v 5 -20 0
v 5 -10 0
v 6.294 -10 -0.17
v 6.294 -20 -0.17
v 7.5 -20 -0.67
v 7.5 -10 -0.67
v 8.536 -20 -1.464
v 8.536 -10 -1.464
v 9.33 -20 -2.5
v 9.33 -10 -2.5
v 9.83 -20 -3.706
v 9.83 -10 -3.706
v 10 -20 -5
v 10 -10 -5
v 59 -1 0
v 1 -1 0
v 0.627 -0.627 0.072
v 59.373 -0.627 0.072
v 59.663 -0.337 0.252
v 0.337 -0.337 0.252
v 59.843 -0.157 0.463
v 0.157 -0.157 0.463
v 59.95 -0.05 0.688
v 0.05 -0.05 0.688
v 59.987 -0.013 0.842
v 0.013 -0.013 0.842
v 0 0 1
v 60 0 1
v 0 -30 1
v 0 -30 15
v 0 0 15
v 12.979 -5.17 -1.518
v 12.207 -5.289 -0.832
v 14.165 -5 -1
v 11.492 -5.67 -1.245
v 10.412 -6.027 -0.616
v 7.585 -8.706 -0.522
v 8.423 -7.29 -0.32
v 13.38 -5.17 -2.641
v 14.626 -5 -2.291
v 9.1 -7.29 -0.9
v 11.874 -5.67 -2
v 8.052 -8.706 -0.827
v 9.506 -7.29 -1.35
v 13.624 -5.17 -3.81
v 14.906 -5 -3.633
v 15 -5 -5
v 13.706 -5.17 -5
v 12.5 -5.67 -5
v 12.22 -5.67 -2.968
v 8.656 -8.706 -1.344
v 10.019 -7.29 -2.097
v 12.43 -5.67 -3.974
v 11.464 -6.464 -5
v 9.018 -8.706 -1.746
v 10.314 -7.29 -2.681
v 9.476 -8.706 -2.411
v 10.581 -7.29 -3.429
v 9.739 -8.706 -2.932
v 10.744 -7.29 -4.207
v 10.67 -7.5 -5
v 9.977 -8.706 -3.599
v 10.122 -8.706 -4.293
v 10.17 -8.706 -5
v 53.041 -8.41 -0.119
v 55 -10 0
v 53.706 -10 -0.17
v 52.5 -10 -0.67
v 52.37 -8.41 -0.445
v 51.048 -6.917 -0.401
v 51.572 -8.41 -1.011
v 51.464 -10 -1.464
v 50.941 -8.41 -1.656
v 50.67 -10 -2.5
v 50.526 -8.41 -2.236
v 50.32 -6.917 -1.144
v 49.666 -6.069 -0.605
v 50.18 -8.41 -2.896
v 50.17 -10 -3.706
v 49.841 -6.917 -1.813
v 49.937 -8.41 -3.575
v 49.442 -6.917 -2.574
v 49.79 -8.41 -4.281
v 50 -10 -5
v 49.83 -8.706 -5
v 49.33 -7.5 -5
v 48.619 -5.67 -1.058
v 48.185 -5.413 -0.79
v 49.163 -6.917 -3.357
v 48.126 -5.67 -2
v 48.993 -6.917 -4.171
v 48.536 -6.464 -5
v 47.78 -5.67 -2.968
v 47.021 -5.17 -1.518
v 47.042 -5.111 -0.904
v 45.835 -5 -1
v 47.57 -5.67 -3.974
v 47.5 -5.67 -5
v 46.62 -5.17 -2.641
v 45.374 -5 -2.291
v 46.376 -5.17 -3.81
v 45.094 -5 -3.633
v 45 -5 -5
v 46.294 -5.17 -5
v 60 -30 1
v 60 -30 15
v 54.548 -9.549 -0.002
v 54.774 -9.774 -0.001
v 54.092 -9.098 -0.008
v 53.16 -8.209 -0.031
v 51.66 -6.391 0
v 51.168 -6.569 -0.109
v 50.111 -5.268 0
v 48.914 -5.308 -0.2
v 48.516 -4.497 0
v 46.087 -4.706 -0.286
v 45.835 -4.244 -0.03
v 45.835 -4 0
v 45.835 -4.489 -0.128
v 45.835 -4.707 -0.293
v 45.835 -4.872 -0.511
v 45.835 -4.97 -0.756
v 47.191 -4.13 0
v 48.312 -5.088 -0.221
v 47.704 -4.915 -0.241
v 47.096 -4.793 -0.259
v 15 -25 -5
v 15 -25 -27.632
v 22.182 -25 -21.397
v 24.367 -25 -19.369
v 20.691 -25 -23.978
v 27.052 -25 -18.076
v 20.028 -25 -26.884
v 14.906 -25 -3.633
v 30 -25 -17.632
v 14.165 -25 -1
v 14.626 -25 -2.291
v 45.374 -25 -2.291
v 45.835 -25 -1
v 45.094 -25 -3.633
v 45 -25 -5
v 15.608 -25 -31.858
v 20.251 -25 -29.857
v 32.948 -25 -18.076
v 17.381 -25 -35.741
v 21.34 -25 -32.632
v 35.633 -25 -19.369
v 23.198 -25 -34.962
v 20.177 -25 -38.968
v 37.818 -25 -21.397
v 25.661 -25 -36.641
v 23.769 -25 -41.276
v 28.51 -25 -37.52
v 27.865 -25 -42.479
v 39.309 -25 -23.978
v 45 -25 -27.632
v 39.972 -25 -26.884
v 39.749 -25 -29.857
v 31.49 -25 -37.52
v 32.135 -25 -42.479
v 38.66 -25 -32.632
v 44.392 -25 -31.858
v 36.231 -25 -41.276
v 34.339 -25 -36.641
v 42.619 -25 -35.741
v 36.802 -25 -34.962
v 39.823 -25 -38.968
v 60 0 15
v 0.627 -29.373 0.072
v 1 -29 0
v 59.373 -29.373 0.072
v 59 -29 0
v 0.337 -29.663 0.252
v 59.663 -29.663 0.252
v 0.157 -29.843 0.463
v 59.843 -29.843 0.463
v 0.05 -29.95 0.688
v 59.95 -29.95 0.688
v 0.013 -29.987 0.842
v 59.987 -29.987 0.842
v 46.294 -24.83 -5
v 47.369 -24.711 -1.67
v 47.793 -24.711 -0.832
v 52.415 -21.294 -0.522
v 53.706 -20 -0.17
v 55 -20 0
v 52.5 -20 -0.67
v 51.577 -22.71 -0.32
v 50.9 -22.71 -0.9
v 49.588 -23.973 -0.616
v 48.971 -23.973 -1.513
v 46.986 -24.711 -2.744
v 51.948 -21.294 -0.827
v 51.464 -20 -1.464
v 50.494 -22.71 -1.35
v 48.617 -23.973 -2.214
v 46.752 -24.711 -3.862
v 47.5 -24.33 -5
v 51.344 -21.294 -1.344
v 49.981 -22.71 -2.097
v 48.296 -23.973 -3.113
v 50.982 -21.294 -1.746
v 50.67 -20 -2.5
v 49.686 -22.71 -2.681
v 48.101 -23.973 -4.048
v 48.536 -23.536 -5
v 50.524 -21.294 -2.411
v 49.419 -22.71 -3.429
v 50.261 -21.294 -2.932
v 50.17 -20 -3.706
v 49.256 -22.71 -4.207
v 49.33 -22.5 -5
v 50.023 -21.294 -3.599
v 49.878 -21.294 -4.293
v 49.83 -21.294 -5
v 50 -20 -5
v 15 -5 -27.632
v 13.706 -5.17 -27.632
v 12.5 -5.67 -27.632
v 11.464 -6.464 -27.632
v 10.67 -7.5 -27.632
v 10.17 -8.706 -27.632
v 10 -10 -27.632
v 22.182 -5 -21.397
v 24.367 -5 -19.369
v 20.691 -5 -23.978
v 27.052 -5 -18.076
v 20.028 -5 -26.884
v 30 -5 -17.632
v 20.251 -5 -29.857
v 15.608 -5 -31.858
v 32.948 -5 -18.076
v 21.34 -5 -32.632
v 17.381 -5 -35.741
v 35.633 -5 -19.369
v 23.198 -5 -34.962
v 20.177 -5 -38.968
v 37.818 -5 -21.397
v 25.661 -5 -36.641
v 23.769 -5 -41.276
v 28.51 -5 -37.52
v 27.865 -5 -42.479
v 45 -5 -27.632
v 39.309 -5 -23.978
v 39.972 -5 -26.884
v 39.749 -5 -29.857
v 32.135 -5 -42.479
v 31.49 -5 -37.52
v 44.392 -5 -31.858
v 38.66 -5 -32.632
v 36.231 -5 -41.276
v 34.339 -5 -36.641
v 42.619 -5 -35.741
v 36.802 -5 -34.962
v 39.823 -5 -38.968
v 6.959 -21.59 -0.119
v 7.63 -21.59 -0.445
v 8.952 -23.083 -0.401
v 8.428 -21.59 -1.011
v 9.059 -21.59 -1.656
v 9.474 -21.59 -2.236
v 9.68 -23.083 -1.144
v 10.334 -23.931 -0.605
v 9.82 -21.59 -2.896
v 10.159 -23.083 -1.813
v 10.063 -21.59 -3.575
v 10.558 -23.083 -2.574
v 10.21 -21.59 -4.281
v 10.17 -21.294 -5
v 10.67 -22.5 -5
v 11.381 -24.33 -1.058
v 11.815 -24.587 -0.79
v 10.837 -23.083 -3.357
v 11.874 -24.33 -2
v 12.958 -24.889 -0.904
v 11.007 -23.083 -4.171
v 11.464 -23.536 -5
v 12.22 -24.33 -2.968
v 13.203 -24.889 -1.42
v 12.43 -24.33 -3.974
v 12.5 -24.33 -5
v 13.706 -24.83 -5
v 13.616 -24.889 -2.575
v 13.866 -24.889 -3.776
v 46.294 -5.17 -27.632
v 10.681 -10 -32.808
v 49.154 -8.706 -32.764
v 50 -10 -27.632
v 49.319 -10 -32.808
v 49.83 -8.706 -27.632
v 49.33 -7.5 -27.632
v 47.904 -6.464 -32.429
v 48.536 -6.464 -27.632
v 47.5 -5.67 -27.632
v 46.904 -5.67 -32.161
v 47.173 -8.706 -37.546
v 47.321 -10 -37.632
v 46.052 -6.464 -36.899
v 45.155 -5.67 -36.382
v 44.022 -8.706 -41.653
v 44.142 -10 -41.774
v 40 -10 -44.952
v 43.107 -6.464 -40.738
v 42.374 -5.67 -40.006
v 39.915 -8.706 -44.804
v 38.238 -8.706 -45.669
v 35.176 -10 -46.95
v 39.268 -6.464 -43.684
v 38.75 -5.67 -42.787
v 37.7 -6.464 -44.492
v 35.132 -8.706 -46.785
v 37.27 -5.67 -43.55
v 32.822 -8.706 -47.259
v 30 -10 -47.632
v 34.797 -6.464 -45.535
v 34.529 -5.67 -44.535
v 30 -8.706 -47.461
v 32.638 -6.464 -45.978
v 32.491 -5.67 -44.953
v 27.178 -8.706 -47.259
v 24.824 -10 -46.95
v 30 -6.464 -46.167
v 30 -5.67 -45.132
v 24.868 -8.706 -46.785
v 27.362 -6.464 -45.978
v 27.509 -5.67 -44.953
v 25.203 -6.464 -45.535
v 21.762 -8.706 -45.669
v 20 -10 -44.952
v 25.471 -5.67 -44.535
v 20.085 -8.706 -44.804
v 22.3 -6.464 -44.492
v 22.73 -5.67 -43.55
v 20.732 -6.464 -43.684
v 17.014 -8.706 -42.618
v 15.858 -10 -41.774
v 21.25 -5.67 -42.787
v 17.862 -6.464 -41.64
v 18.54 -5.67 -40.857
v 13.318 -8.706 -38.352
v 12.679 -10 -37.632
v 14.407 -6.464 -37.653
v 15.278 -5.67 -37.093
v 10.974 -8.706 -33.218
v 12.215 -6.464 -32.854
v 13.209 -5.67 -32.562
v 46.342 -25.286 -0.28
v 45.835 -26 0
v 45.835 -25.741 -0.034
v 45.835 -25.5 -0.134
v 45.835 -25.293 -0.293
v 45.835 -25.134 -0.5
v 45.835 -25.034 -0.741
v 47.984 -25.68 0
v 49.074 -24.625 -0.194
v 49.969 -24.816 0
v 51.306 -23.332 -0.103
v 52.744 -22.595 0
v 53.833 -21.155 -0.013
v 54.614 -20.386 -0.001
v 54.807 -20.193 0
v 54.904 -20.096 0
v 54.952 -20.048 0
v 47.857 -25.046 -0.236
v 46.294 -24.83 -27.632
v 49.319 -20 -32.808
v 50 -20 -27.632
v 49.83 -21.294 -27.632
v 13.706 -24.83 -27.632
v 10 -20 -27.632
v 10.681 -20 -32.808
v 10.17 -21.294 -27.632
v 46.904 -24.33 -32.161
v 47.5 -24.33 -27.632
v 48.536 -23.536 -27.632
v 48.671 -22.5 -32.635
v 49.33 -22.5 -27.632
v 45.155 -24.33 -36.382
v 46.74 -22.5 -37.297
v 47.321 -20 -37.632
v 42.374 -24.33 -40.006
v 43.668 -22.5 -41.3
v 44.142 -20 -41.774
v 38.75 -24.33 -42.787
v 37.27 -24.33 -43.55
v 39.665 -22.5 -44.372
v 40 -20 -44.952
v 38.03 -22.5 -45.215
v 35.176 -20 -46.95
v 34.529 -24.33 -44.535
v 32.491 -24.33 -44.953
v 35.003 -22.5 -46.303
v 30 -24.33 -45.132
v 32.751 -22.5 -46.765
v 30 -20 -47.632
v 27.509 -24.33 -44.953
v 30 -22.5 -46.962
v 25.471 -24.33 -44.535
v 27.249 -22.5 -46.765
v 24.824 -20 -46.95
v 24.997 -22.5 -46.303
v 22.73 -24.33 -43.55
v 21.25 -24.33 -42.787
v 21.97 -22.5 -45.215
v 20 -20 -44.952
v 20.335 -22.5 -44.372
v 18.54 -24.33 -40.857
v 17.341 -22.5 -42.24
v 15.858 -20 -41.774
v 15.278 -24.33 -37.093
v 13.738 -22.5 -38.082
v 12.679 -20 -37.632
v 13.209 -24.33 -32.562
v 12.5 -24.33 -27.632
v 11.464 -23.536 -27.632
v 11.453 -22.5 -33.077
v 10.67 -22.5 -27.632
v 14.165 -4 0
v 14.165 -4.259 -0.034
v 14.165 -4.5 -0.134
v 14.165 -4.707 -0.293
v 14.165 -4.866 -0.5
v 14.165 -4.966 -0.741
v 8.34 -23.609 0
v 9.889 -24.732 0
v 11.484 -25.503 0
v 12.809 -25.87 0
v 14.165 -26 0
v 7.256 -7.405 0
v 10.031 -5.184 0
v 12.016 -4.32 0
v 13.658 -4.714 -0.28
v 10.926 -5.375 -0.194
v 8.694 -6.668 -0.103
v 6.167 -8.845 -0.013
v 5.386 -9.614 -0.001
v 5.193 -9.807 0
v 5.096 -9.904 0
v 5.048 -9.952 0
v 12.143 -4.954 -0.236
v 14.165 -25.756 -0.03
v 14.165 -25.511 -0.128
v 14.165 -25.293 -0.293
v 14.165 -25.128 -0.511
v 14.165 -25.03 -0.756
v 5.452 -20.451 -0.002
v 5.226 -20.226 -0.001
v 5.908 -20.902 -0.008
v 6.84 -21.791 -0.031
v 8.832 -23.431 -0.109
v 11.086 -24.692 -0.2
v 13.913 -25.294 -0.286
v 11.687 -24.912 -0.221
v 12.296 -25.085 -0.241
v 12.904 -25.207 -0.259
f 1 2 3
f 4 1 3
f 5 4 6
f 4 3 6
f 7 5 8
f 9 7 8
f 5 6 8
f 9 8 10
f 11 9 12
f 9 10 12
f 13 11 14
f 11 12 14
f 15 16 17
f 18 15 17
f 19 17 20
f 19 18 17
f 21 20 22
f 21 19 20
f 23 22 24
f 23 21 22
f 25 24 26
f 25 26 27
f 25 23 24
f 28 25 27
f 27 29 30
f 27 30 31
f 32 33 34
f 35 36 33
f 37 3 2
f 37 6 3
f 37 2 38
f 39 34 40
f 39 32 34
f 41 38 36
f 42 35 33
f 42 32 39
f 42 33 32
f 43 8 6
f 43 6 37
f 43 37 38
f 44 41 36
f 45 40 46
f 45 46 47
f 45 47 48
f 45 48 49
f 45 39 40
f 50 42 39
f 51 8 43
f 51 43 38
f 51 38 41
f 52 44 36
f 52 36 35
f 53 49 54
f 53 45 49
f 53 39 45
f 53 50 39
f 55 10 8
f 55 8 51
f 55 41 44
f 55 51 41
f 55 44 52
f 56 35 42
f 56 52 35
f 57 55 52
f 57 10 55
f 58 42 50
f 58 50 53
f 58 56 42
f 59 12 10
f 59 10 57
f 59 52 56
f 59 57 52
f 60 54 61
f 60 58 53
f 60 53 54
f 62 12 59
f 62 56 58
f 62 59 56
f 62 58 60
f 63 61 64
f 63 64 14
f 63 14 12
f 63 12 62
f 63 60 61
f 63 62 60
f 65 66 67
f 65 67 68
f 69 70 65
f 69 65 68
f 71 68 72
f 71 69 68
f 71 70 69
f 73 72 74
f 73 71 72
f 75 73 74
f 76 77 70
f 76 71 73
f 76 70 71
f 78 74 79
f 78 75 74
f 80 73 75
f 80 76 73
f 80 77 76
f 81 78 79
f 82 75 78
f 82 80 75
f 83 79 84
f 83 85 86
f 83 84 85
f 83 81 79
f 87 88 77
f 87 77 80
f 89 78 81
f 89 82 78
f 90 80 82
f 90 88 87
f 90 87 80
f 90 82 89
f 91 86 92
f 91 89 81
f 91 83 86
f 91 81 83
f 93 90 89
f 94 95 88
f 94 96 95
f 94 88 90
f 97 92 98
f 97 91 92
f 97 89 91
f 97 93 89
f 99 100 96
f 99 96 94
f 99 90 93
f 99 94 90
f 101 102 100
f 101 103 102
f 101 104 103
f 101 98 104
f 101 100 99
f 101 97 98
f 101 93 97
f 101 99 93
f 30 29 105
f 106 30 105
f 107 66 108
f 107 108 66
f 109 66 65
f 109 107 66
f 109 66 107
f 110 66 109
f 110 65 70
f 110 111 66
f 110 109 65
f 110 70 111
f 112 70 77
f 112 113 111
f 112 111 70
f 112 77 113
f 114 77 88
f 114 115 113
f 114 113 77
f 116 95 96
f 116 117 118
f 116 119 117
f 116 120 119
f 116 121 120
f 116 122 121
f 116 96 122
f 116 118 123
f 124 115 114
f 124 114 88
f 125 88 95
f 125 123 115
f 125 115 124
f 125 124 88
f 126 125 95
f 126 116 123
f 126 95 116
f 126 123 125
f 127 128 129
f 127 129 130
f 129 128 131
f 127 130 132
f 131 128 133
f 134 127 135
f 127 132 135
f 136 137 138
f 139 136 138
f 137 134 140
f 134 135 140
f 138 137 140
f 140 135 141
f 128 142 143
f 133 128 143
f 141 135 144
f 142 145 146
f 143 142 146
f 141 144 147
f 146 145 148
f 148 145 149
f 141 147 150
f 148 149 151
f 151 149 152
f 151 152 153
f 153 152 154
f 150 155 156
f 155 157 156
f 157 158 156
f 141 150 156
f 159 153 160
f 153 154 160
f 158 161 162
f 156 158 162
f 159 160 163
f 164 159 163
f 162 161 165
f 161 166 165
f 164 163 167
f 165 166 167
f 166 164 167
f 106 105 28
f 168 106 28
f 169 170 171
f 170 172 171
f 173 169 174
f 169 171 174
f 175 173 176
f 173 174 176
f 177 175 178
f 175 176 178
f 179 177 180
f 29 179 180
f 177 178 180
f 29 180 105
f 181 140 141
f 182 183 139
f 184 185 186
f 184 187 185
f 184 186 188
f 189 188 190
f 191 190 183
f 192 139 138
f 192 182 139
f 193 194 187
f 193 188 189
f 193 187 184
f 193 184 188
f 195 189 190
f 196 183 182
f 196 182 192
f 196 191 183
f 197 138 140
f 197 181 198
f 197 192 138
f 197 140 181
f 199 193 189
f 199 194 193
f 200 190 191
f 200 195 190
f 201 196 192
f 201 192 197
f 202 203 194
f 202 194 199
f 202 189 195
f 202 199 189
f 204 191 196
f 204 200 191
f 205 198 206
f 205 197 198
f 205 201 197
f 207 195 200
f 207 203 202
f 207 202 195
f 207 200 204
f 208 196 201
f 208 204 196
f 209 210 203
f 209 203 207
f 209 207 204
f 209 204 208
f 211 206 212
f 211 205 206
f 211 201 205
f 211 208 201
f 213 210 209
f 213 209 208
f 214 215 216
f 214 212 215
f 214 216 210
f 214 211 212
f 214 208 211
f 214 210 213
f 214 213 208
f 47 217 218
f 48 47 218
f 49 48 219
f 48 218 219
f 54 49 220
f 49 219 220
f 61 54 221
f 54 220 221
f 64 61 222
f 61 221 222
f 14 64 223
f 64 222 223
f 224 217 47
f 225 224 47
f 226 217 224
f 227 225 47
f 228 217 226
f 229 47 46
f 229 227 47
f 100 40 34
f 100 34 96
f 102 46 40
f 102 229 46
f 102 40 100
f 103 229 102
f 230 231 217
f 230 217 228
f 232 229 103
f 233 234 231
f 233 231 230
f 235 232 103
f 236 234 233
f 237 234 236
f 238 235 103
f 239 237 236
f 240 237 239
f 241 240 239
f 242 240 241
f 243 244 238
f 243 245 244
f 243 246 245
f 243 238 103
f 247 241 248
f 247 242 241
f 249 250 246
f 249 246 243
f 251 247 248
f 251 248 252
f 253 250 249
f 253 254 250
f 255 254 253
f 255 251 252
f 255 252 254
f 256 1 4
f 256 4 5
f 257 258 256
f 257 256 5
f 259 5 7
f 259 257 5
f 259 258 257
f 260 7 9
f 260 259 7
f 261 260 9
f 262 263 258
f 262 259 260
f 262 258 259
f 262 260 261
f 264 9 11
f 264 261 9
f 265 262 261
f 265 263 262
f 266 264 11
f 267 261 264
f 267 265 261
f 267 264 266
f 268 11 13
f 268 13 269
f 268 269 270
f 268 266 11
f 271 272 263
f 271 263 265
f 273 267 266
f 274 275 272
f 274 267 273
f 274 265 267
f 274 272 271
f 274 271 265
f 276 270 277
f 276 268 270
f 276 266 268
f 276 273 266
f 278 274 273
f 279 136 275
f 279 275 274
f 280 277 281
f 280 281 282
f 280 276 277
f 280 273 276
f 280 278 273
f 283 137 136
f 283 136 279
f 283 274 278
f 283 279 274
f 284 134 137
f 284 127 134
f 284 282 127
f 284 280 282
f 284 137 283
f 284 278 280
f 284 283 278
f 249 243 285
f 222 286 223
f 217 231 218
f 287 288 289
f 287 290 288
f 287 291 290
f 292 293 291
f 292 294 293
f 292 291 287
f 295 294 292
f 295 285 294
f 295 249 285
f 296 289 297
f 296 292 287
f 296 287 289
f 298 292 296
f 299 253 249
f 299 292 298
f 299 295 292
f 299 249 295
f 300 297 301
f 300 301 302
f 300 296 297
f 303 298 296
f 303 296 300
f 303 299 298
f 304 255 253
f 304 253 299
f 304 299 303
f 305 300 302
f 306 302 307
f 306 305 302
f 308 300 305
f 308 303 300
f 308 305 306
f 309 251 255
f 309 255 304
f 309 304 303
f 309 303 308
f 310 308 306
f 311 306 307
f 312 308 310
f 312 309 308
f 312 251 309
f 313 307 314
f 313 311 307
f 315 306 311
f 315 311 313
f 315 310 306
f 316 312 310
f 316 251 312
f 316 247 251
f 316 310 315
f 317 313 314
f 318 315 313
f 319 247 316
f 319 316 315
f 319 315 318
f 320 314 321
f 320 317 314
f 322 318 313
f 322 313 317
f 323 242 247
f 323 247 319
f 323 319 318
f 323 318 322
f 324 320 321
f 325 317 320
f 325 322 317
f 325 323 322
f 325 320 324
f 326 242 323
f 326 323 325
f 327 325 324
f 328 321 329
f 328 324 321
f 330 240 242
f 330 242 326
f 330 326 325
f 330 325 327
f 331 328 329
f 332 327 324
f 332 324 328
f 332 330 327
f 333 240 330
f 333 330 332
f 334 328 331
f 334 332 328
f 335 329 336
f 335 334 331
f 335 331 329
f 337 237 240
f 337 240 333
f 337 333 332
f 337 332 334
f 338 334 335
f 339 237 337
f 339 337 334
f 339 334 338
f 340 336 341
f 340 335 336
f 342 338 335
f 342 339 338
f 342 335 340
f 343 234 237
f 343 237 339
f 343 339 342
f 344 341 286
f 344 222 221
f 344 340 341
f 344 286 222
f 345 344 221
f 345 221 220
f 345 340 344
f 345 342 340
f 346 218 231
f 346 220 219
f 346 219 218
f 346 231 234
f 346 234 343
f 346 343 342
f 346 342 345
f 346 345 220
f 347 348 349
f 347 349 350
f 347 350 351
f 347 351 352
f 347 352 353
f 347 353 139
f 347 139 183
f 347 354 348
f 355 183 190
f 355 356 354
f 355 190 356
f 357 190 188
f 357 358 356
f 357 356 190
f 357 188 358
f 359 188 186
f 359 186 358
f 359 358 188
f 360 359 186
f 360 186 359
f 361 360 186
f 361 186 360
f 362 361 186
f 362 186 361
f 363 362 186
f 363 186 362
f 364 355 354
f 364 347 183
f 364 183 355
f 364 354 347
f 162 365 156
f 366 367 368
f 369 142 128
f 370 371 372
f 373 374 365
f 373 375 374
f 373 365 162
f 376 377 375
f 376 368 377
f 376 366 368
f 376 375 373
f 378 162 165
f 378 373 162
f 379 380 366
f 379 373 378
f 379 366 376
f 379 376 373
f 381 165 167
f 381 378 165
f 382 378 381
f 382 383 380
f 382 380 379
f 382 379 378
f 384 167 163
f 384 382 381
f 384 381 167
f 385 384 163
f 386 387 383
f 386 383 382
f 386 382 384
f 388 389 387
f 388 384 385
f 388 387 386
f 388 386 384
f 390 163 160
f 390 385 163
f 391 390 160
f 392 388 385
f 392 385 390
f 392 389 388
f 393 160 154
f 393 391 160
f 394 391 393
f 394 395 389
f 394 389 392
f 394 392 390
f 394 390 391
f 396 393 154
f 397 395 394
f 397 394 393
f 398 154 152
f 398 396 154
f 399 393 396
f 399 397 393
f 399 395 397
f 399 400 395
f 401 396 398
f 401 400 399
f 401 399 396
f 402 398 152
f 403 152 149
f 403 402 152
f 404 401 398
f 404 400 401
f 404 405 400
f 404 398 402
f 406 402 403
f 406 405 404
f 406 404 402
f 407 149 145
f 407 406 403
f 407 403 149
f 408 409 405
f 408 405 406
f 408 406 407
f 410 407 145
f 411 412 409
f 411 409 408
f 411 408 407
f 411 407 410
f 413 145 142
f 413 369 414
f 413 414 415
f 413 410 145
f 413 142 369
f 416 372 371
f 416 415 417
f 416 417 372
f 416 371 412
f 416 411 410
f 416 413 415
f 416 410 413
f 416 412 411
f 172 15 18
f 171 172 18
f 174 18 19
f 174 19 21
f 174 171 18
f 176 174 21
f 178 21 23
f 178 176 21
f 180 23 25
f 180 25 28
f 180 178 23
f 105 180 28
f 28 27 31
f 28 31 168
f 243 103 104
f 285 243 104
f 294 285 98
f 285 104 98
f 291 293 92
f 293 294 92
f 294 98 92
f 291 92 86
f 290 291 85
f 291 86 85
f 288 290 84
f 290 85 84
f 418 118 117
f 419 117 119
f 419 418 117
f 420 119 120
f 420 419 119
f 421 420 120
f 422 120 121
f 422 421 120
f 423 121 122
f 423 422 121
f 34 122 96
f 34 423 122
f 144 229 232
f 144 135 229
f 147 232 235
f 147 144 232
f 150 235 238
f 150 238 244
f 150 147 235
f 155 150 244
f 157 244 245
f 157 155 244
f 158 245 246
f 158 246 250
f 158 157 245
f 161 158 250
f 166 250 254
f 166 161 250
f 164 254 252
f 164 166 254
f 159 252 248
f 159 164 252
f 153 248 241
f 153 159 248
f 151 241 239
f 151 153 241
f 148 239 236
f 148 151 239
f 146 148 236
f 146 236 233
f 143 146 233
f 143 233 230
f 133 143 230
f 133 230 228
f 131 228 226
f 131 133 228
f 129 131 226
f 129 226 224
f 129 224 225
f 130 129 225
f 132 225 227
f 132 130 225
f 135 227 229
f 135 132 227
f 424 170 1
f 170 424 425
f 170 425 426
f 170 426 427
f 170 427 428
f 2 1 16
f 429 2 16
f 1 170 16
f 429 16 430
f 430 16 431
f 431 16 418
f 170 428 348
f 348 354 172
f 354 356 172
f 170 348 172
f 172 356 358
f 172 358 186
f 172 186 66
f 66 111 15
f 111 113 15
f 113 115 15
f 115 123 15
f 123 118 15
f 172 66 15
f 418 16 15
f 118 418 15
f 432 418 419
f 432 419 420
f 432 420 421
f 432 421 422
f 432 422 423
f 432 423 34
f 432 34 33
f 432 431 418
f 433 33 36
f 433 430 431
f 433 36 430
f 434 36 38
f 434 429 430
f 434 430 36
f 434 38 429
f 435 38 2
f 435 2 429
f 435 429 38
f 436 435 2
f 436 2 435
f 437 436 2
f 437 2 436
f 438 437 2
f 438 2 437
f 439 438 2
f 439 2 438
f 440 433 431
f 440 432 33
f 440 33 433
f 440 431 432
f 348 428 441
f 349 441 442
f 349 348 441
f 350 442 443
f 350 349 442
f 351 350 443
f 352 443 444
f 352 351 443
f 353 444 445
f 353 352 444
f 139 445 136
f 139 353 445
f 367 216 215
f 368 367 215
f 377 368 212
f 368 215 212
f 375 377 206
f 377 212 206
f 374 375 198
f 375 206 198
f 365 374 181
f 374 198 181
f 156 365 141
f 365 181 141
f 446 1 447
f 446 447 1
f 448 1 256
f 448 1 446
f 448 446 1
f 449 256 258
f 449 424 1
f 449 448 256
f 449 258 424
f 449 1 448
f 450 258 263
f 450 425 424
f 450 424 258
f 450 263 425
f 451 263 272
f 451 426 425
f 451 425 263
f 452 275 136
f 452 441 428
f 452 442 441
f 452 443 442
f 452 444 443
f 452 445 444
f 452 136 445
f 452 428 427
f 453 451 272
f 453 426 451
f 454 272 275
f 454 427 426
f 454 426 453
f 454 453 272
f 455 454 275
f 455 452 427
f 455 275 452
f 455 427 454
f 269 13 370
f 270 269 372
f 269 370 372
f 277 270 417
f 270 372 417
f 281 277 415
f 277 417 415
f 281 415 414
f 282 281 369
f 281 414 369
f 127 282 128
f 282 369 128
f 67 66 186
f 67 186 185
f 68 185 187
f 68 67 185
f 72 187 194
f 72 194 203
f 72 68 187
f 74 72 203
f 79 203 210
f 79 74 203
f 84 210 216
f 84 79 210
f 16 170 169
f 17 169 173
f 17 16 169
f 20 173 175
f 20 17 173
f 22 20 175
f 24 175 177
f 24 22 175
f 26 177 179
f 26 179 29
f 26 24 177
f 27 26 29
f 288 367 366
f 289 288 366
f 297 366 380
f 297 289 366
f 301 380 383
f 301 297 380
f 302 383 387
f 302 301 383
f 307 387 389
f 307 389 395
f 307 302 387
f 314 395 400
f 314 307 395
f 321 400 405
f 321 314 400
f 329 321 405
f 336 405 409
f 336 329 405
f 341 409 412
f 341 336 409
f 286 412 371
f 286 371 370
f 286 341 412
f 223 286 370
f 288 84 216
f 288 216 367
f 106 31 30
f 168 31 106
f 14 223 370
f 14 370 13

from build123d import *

# Parameters (mm, degrees)
SKETCH3_W           = 60
SKETCH3_H           = 30
BOSS_EXTRUDE1_DEPTH = 15
SKETCH4_R           = 10
BOSS_EXTRUDE2_DEPTH = 10
FILLET1_R           = 5
FILLET2_R           = 5
FILLET3_R           = 1


with BuildPart() as part:
    # Sketch3 → Boss-Extrude1 (new body)
    with BuildSketch(Plane.XY):
        with Locations((30, -15)):
            Rectangle(SKETCH3_W, SKETCH3_H)
    extrude(amount=BOSS_EXTRUDE1_DEPTH)

    # Sketch4 → Boss-Extrude2 (add, symmetric)
    with BuildSketch(Plane(origin=(0, -15, 0), x_dir=(1, 0, 0), z_dir=(0, 1, 0))):
        with BuildLine():
            Line((10, 27.631533215), (10, 0))
            Line((10, 0), (50, 0))
            Line((50, 0), (50, 27.631533215))
            ThreePointArc((50, 27.631533215), (30, 47.631533215), (10, 27.631533215))
        make_face()
        with Locations(Location((30, 27.631533215, 0), (0, 0, 270))):
            Circle(SKETCH4_R, mode=Mode.SUBTRACT)
    extrude(amount=BOSS_EXTRUDE2_DEPTH, both=True)

    # Fillet1
    fillet1_edges = [part.edges().sort_by_distance(p)[0] for p in [
        (10, -15, 0),
        (50, -15, 0),
    ]]
    fillet(fillet1_edges, radius=FILLET1_R)

    # Fillet2
    # the kernel refuses this fillet: 5 mm, written as the material it takes off along each edge
    with BuildSketch(Plane(origin=(30, -5, -27.631533215), x_dir=(1, 0, 0), z_dir=(0, 0, 1))) as fillet2_piece_1:
        with BuildLine():
            CenterArc((20 - FILLET2_R, -FILLET2_R), FILLET2_R, 0, 90)
            Line((20 - FILLET2_R, 0), (20, 0))
            Line((20, 0), (20, -FILLET2_R))
        make_face()
    revolve(axis=Axis((30, -5, -27.631533215), (0, 1, 0)), revolution_arc=180, mode=Mode.SUBTRACT)
    with BuildSketch(Plane(origin=(10, -5, -27.631533215), x_dir=(0, -1, 0), z_dir=(0, 0, 1)), Plane(origin=(50, -5, -5), x_dir=(0, -1, 0), z_dir=(0, 0, -1))) as fillet2_piece_2:
        with BuildLine():
            CenterArc((FILLET2_R, FILLET2_R), FILLET2_R, 180, 90)
            Line((0, FILLET2_R), (0, 0))
            Line((0, 0), (FILLET2_R, 0))
        make_face()
    extrude(amount=22.631533215, mode=Mode.SUBTRACT)
    with BuildSketch(Plane(origin=(30, -25, -27.631533215), x_dir=(1, 0, 0), z_dir=(0, 0, 1))) as fillet2_piece_3:
        with BuildLine():
            CenterArc((20 - FILLET2_R, FILLET2_R), FILLET2_R, 270, 90)
            Line((20 - FILLET2_R, 0), (20, 0))
            Line((20, 0), (20, FILLET2_R))
        make_face()
    revolve(axis=Axis((30, -25, -27.631533215), (0, 1, 0)), revolution_arc=180, mode=Mode.SUBTRACT)
    with BuildSketch(Plane(origin=(10, -25, -27.631533215), x_dir=(0, 1, 0), z_dir=(0, 0, 1)), Plane(origin=(50, -25, -5), x_dir=(0, 1, 0), z_dir=(0, 0, -1))) as fillet2_piece_4:
        with BuildLine():
            CenterArc((FILLET2_R, -FILLET2_R), FILLET2_R, 90, 90)
            Line((0, -FILLET2_R), (0, 0))
            Line((0, 0), (FILLET2_R, 0))
        make_face()
    extrude(amount=22.631533215, mode=Mode.SUBTRACT)
    with BuildSketch(Plane(origin=(55, -25, -5), x_dir=(0.5976672776328272, 0, -0.8017442392976484), z_dir=(-0.8017442392976484, 0, -0.5976672776328272))) as fillet2_piece_5_section:
        with BuildLine():
            CenterArc((5 + FILLET2_R, -FILLET2_R), FILLET2_R, 90, 90)
            Line((5 + FILLET2_R, 0), (5, 0))
            Line((5, 0), (5, -FILLET2_R))
        make_face()
    fillet2_piece_5 = revolve(axis=Axis((55, -25, -5), (0, -1, 0)), revolution_arc=233.296989237, mode=Mode.PRIVATE)
    fillet2_piece_5 = split(fillet2_piece_5, bisect_by=Plane(origin=(51.250305352, -23.441858441, 0), z_dir=(0, 0, -1)), keep=Keep.TOP, mode=Mode.PRIVATE)
    add(fillet2_piece_5, mode=Mode.SUBTRACT)
    with BuildSketch(Plane(origin=(55, -5, -5), x_dir=(0.5976672776328272, 0, -0.8017442392976484), z_dir=(-0.8017442392976484, 0, -0.5976672776328272))) as fillet2_piece_6_section:
        with BuildLine():
            CenterArc((5 + FILLET2_R, FILLET2_R), FILLET2_R, 180, 90)
            Line((5, FILLET2_R), (5, 0))
            Line((5, 0), (5 + FILLET2_R, 0))
        make_face()
    fillet2_piece_6 = revolve(axis=Axis((55, -5, -5), (0, -1, 0)), revolution_arc=233.296989237, mode=Mode.PRIVATE)
    fillet2_piece_6 = split(fillet2_piece_6, bisect_by=Plane(origin=(51.250305352, -6.558141559, 0), z_dir=(0, 0, -1)), keep=Keep.TOP, mode=Mode.PRIVATE)
    add(fillet2_piece_6, mode=Mode.SUBTRACT)
    with BuildSketch(Plane(origin=(5, -25, -5), x_dir=(-0.5976672776328278, 0, -0.801744239297648), z_dir=(0.801744239297648, 0, -0.5976672776328278))) as fillet2_piece_7_section:
        with BuildLine():
            CenterArc((5 + FILLET2_R, FILLET2_R), FILLET2_R, 180, 90)
            Line((5 + FILLET2_R, 0), (5, 0))
            Line((5, 0), (5, FILLET2_R))
        make_face()
    fillet2_piece_7 = revolve(axis=Axis((5, -25, -5), (0, 1, 0)), revolution_arc=233.296989237, mode=Mode.PRIVATE)
    fillet2_piece_7 = split(fillet2_piece_7, bisect_by=Plane(origin=(8.749694574, -23.441858005, 0), z_dir=(0, 0, -1)), keep=Keep.TOP, mode=Mode.PRIVATE)
    add(fillet2_piece_7, mode=Mode.SUBTRACT)
    with BuildSketch(Plane(origin=(5, -5, -5), x_dir=(-0.5976672776328278, 0, -0.801744239297648), z_dir=(0.801744239297648, 0, -0.5976672776328278))) as fillet2_piece_8_section:
        with BuildLine():
            CenterArc((5 + FILLET2_R, -FILLET2_R), FILLET2_R, 90, 90)
            Line((5 + FILLET2_R, 0), (5, 0))
            Line((5, 0), (5, -FILLET2_R))
        make_face()
    fillet2_piece_8 = revolve(axis=Axis((5, -5, -5), (0, 1, 0)), revolution_arc=233.296989237, mode=Mode.PRIVATE)
    fillet2_piece_8 = split(fillet2_piece_8, bisect_by=Plane(origin=(8.749694574, -6.558141995, 0), z_dir=(0, 0, -1)), keep=Keep.TOP, mode=Mode.PRIVATE)
    add(fillet2_piece_8, mode=Mode.SUBTRACT)

    # Fillet3
    fillet3_edges = [part.edges().sort_by_distance(p)[0] for p in [
        (30, 0, 0),
        (60, -15, 0),
        (30, -30, 0),
        (30, -25, 0),
        (0, -15, 0),
        (30, -5, 0),
        (51.140144071, -23.381125805, 0),
        (8.859855929, -23.381125805, 0),
        (51.140144071, -6.618874195, 0),
        (8.859855929, -6.618874195, 0),
    ]]
    fillet(fillet3_edges, radius=FILLET3_R)


solid = part.part
